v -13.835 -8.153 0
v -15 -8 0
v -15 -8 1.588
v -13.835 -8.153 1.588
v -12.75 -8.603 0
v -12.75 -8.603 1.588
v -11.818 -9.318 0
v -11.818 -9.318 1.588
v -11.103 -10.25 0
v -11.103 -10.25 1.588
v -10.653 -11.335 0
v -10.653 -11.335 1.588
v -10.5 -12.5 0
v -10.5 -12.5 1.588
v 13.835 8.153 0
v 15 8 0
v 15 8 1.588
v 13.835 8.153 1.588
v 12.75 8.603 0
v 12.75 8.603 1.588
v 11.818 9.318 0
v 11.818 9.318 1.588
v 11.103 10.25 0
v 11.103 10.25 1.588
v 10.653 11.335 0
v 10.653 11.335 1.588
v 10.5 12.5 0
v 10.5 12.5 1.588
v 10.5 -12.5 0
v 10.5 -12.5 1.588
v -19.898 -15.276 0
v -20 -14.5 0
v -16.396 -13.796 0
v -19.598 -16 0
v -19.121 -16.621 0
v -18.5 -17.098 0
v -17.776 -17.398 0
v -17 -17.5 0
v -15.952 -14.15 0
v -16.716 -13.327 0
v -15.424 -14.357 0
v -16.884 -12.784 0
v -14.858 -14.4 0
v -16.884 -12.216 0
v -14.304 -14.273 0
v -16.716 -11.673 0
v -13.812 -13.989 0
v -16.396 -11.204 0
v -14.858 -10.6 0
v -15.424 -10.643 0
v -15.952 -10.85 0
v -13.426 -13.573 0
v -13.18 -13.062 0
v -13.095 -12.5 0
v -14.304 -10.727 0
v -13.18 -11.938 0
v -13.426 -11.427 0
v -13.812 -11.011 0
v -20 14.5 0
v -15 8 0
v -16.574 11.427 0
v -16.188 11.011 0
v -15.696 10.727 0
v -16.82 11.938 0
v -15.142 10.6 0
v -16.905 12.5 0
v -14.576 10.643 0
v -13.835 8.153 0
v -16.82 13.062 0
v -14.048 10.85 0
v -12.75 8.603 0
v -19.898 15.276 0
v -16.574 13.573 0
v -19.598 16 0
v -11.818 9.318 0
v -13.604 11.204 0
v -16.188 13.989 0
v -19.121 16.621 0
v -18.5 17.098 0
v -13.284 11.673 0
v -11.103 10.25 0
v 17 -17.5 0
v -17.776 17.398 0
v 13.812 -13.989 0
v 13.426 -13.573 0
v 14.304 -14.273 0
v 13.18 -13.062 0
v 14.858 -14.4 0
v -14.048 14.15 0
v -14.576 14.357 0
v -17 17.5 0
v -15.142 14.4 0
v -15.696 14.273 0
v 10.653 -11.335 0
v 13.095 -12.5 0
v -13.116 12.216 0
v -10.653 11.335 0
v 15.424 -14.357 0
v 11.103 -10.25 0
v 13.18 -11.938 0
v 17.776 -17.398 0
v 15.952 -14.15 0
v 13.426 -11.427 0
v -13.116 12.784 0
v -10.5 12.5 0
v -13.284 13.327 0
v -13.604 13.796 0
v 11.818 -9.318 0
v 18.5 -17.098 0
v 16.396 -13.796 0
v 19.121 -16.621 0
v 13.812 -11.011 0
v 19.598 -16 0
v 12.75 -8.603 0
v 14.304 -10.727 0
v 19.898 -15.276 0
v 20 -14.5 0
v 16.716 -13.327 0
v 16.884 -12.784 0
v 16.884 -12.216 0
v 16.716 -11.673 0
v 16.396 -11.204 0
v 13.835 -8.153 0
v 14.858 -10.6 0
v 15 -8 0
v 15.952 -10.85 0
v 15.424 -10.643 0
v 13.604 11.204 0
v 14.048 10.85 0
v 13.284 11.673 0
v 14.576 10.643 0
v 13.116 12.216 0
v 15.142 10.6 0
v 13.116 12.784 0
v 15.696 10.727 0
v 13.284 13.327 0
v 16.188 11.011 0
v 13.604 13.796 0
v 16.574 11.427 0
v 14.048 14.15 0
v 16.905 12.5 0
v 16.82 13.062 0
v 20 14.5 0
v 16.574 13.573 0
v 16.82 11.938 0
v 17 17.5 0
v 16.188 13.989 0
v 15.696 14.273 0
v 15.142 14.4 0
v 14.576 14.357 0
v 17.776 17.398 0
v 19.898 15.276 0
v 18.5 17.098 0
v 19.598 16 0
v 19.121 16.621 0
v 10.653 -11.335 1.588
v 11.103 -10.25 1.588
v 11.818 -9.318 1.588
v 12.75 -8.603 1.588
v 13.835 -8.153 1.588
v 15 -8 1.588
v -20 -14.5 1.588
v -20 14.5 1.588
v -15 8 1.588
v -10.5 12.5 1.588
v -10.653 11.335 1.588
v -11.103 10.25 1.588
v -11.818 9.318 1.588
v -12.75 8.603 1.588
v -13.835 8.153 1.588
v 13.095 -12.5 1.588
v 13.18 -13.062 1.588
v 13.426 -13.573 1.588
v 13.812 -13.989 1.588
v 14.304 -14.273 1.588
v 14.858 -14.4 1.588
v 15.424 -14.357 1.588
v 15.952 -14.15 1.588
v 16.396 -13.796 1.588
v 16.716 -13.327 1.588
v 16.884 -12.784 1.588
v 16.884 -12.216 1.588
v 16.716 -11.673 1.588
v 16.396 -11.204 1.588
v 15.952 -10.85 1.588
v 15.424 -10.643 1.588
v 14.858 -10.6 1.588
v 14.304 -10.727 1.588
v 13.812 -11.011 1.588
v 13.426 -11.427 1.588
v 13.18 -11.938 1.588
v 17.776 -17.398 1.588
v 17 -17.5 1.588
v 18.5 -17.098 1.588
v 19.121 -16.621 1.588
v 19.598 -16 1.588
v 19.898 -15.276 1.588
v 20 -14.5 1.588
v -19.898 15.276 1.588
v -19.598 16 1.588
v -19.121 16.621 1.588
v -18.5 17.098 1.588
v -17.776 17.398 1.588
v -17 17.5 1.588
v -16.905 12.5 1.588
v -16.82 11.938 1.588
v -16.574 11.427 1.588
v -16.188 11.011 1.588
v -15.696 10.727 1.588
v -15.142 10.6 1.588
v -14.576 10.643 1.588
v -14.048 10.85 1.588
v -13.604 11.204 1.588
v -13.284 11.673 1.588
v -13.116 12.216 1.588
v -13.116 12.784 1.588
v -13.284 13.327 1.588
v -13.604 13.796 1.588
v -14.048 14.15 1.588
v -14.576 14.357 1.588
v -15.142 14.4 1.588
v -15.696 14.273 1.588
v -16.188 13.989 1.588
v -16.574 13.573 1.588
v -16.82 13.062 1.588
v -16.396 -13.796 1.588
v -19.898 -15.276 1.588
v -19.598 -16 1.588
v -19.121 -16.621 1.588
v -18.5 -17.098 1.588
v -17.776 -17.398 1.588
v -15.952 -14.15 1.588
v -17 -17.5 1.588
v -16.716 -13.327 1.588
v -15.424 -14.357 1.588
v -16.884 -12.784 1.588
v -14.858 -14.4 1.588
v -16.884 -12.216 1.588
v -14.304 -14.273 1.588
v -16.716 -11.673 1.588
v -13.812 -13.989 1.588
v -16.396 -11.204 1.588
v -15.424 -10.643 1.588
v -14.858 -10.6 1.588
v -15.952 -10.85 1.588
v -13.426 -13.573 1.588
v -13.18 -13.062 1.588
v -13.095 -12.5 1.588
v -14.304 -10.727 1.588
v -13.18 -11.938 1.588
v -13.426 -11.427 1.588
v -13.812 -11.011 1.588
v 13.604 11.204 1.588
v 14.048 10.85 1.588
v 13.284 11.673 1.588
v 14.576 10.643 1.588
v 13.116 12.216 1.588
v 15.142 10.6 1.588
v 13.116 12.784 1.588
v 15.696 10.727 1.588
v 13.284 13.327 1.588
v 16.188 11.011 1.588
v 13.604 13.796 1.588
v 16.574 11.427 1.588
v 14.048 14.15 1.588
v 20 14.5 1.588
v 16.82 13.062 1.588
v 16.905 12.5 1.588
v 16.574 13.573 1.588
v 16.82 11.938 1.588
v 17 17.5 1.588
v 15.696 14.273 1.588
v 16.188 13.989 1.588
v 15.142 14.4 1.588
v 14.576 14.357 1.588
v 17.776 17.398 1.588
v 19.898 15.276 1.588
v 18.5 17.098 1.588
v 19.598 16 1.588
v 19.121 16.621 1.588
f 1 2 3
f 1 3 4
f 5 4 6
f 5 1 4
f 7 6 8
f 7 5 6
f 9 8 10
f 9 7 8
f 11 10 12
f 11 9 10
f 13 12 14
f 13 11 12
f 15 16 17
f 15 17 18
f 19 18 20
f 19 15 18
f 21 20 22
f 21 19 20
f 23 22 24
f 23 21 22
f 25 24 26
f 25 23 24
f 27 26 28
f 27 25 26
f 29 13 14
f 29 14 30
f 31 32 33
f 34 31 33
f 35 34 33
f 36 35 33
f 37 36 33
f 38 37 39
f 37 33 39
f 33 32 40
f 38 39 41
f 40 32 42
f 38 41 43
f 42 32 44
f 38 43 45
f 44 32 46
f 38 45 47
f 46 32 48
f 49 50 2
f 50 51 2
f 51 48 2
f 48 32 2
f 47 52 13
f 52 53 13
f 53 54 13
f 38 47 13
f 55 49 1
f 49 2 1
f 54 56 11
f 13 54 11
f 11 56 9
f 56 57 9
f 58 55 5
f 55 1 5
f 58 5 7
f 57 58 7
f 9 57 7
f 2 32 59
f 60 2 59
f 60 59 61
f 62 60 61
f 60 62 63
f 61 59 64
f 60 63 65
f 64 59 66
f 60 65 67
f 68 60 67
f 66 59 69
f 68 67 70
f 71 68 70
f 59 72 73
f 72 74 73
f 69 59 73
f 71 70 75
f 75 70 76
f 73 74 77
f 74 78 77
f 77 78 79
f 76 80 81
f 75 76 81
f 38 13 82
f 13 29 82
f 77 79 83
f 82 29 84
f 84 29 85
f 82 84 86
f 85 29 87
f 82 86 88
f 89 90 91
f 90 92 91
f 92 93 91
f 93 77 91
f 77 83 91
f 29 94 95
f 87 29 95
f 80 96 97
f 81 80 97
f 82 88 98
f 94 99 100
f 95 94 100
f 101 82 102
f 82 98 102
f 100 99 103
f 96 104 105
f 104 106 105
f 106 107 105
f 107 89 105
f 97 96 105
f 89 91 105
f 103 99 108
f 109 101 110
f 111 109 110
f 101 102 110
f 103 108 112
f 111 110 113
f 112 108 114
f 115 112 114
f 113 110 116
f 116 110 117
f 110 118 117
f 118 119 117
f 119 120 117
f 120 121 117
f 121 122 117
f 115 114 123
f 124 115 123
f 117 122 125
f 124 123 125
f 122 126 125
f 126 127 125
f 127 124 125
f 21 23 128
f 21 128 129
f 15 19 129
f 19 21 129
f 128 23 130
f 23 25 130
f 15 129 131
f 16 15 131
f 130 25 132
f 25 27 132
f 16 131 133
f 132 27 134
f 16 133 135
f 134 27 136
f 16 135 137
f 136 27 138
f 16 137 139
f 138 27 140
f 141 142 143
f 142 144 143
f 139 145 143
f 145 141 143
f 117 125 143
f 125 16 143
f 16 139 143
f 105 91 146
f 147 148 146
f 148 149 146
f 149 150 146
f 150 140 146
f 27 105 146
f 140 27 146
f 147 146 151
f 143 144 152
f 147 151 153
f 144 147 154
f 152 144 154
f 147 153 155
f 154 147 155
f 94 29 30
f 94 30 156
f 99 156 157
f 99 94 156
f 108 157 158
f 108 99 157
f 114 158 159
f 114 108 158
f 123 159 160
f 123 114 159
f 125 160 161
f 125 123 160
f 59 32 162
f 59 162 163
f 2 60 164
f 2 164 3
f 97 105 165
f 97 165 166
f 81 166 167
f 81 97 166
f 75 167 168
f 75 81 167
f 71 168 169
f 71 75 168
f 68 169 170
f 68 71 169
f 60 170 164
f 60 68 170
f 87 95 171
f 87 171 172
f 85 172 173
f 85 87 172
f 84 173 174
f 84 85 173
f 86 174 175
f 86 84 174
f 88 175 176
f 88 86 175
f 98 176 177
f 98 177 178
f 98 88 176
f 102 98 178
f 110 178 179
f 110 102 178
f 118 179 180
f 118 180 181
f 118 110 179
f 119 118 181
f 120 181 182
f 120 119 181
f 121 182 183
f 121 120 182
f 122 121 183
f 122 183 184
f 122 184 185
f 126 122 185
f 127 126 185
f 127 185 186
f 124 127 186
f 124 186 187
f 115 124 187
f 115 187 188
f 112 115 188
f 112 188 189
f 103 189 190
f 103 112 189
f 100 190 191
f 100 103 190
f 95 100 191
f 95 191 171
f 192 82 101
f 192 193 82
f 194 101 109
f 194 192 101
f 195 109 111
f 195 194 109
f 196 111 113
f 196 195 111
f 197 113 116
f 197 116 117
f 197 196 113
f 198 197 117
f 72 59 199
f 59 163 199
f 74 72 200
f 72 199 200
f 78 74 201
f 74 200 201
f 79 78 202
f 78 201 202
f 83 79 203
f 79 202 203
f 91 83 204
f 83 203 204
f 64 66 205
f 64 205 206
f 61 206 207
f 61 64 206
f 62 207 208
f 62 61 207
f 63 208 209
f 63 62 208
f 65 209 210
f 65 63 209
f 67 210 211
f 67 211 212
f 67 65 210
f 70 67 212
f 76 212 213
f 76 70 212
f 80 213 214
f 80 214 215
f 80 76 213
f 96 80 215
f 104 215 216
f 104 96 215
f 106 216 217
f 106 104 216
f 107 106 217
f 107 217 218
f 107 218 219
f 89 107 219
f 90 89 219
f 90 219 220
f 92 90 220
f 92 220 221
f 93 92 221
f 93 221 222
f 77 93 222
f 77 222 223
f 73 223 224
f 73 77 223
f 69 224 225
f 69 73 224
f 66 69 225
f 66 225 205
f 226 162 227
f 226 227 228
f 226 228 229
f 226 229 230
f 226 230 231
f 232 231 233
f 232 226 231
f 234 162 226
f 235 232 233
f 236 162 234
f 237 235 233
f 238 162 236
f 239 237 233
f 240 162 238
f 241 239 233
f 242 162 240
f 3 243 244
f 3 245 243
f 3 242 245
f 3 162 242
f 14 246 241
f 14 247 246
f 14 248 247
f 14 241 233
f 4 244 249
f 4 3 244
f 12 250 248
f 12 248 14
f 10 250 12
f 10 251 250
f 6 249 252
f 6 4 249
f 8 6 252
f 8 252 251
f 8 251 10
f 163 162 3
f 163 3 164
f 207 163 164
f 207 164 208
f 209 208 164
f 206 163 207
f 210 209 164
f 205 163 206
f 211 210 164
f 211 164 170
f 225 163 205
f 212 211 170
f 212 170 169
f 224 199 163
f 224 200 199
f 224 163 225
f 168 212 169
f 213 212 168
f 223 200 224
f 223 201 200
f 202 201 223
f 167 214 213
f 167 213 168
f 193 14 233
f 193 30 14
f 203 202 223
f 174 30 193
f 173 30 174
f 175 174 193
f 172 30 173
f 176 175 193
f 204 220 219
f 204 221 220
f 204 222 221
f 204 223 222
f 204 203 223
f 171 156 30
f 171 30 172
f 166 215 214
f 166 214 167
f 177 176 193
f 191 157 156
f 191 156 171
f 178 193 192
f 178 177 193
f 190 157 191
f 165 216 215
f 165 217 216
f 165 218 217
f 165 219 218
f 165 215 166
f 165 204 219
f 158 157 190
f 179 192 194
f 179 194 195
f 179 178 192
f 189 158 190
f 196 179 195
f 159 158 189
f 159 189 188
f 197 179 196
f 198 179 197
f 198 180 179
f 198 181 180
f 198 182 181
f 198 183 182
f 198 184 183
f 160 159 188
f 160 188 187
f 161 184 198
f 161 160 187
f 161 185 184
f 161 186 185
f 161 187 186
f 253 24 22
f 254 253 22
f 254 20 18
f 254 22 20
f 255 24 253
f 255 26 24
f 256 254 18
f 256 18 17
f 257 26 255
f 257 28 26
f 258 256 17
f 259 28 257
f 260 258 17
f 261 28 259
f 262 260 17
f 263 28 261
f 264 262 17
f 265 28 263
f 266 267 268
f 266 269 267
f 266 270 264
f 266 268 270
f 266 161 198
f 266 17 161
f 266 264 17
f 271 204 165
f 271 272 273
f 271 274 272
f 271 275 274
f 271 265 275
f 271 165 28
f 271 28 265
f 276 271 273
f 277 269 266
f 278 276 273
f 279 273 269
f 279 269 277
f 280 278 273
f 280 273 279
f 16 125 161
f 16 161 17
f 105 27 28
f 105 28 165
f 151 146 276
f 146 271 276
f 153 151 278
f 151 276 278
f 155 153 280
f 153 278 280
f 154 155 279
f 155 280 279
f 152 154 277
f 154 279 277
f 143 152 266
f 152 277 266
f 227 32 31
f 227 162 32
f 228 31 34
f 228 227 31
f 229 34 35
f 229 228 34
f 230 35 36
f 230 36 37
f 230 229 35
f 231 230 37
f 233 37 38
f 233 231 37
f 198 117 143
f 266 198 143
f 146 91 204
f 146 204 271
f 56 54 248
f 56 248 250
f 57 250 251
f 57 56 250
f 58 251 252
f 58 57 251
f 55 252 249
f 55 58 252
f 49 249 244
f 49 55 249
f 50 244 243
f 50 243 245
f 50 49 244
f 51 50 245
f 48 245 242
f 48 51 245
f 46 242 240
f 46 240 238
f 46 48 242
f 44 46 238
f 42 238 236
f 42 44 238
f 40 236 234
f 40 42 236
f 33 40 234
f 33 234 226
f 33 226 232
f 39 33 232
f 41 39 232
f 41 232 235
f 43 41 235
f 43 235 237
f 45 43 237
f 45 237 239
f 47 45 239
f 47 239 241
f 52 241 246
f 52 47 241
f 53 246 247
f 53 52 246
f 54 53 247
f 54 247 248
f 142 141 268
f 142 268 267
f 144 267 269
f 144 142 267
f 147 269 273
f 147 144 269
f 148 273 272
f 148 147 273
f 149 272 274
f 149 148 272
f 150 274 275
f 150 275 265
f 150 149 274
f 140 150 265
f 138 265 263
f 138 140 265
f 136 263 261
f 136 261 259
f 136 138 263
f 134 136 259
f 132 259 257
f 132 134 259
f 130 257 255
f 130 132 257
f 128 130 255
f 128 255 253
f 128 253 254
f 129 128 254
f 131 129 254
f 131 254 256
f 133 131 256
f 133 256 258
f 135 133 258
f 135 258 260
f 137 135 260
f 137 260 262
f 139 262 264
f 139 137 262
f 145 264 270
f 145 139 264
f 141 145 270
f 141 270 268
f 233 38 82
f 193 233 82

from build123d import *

# Parameters (mm, degrees)
SKETCH1_W           = 40
SKETCH1_H           = 35
SKETCH1_R           = 1.905
BOSS_EXTRUDE1_DEPTH = 1.5875
FILLET1_R           = 3


with BuildPart() as part:
    # Sketch1 → Boss-Extrude1 (new body)
    with BuildSketch(Plane.XY):
        Rectangle(SKETCH1_W, SKETCH1_H)
        with Locations((-15, -12.5)):
            Circle(SKETCH1_R, mode=Mode.SUBTRACT)
        with Locations(Location((15, -12.5, 0), (0, 0, 180))):
            Circle(SKETCH1_R, mode=Mode.SUBTRACT)
        with Locations((15, 12.5)):
            Circle(SKETCH1_R, mode=Mode.SUBTRACT)
        with Locations(Location((-15, 12.5, 0), (0, 0, 180))):
            Circle(SKETCH1_R, mode=Mode.SUBTRACT)
        with BuildLine():
            Line((-15, 8), (-15, -8))
            ThreePointArc((-15, -8), (-11.818019485, -9.318019485), (-10.5, -12.5))
            Line((-10.5, -12.5), (10.5, -12.5))
            ThreePointArc((10.5, -12.5), (11.818019485, -9.318019485), (15, -8))
            Line((15, -8), (15, 8))
            ThreePointArc((15, 8), (11.818019485, 9.318019485), (10.5, 12.5))
            Line((10.5, 12.5), (-10.5, 12.5))
            ThreePointArc((-10.5, 12.5), (-11.818019485, 9.318019485), (-15, 8))
        make_face(mode=Mode.SUBTRACT)
    extrude(amount=BOSS_EXTRUDE1_DEPTH)

    # Fillet1
    fillet1_edges = [part.edges().sort_by_distance(p)[0] for p in [
        (20, -17.5, 0.79375),
        (-20, -17.5, 0.79375),
        (-20, 17.5, 0.79375),
        (20, 17.5, 0.79375),
    ]]
    fillet(fillet1_edges, radius=FILLET1_R)


solid = part.part
